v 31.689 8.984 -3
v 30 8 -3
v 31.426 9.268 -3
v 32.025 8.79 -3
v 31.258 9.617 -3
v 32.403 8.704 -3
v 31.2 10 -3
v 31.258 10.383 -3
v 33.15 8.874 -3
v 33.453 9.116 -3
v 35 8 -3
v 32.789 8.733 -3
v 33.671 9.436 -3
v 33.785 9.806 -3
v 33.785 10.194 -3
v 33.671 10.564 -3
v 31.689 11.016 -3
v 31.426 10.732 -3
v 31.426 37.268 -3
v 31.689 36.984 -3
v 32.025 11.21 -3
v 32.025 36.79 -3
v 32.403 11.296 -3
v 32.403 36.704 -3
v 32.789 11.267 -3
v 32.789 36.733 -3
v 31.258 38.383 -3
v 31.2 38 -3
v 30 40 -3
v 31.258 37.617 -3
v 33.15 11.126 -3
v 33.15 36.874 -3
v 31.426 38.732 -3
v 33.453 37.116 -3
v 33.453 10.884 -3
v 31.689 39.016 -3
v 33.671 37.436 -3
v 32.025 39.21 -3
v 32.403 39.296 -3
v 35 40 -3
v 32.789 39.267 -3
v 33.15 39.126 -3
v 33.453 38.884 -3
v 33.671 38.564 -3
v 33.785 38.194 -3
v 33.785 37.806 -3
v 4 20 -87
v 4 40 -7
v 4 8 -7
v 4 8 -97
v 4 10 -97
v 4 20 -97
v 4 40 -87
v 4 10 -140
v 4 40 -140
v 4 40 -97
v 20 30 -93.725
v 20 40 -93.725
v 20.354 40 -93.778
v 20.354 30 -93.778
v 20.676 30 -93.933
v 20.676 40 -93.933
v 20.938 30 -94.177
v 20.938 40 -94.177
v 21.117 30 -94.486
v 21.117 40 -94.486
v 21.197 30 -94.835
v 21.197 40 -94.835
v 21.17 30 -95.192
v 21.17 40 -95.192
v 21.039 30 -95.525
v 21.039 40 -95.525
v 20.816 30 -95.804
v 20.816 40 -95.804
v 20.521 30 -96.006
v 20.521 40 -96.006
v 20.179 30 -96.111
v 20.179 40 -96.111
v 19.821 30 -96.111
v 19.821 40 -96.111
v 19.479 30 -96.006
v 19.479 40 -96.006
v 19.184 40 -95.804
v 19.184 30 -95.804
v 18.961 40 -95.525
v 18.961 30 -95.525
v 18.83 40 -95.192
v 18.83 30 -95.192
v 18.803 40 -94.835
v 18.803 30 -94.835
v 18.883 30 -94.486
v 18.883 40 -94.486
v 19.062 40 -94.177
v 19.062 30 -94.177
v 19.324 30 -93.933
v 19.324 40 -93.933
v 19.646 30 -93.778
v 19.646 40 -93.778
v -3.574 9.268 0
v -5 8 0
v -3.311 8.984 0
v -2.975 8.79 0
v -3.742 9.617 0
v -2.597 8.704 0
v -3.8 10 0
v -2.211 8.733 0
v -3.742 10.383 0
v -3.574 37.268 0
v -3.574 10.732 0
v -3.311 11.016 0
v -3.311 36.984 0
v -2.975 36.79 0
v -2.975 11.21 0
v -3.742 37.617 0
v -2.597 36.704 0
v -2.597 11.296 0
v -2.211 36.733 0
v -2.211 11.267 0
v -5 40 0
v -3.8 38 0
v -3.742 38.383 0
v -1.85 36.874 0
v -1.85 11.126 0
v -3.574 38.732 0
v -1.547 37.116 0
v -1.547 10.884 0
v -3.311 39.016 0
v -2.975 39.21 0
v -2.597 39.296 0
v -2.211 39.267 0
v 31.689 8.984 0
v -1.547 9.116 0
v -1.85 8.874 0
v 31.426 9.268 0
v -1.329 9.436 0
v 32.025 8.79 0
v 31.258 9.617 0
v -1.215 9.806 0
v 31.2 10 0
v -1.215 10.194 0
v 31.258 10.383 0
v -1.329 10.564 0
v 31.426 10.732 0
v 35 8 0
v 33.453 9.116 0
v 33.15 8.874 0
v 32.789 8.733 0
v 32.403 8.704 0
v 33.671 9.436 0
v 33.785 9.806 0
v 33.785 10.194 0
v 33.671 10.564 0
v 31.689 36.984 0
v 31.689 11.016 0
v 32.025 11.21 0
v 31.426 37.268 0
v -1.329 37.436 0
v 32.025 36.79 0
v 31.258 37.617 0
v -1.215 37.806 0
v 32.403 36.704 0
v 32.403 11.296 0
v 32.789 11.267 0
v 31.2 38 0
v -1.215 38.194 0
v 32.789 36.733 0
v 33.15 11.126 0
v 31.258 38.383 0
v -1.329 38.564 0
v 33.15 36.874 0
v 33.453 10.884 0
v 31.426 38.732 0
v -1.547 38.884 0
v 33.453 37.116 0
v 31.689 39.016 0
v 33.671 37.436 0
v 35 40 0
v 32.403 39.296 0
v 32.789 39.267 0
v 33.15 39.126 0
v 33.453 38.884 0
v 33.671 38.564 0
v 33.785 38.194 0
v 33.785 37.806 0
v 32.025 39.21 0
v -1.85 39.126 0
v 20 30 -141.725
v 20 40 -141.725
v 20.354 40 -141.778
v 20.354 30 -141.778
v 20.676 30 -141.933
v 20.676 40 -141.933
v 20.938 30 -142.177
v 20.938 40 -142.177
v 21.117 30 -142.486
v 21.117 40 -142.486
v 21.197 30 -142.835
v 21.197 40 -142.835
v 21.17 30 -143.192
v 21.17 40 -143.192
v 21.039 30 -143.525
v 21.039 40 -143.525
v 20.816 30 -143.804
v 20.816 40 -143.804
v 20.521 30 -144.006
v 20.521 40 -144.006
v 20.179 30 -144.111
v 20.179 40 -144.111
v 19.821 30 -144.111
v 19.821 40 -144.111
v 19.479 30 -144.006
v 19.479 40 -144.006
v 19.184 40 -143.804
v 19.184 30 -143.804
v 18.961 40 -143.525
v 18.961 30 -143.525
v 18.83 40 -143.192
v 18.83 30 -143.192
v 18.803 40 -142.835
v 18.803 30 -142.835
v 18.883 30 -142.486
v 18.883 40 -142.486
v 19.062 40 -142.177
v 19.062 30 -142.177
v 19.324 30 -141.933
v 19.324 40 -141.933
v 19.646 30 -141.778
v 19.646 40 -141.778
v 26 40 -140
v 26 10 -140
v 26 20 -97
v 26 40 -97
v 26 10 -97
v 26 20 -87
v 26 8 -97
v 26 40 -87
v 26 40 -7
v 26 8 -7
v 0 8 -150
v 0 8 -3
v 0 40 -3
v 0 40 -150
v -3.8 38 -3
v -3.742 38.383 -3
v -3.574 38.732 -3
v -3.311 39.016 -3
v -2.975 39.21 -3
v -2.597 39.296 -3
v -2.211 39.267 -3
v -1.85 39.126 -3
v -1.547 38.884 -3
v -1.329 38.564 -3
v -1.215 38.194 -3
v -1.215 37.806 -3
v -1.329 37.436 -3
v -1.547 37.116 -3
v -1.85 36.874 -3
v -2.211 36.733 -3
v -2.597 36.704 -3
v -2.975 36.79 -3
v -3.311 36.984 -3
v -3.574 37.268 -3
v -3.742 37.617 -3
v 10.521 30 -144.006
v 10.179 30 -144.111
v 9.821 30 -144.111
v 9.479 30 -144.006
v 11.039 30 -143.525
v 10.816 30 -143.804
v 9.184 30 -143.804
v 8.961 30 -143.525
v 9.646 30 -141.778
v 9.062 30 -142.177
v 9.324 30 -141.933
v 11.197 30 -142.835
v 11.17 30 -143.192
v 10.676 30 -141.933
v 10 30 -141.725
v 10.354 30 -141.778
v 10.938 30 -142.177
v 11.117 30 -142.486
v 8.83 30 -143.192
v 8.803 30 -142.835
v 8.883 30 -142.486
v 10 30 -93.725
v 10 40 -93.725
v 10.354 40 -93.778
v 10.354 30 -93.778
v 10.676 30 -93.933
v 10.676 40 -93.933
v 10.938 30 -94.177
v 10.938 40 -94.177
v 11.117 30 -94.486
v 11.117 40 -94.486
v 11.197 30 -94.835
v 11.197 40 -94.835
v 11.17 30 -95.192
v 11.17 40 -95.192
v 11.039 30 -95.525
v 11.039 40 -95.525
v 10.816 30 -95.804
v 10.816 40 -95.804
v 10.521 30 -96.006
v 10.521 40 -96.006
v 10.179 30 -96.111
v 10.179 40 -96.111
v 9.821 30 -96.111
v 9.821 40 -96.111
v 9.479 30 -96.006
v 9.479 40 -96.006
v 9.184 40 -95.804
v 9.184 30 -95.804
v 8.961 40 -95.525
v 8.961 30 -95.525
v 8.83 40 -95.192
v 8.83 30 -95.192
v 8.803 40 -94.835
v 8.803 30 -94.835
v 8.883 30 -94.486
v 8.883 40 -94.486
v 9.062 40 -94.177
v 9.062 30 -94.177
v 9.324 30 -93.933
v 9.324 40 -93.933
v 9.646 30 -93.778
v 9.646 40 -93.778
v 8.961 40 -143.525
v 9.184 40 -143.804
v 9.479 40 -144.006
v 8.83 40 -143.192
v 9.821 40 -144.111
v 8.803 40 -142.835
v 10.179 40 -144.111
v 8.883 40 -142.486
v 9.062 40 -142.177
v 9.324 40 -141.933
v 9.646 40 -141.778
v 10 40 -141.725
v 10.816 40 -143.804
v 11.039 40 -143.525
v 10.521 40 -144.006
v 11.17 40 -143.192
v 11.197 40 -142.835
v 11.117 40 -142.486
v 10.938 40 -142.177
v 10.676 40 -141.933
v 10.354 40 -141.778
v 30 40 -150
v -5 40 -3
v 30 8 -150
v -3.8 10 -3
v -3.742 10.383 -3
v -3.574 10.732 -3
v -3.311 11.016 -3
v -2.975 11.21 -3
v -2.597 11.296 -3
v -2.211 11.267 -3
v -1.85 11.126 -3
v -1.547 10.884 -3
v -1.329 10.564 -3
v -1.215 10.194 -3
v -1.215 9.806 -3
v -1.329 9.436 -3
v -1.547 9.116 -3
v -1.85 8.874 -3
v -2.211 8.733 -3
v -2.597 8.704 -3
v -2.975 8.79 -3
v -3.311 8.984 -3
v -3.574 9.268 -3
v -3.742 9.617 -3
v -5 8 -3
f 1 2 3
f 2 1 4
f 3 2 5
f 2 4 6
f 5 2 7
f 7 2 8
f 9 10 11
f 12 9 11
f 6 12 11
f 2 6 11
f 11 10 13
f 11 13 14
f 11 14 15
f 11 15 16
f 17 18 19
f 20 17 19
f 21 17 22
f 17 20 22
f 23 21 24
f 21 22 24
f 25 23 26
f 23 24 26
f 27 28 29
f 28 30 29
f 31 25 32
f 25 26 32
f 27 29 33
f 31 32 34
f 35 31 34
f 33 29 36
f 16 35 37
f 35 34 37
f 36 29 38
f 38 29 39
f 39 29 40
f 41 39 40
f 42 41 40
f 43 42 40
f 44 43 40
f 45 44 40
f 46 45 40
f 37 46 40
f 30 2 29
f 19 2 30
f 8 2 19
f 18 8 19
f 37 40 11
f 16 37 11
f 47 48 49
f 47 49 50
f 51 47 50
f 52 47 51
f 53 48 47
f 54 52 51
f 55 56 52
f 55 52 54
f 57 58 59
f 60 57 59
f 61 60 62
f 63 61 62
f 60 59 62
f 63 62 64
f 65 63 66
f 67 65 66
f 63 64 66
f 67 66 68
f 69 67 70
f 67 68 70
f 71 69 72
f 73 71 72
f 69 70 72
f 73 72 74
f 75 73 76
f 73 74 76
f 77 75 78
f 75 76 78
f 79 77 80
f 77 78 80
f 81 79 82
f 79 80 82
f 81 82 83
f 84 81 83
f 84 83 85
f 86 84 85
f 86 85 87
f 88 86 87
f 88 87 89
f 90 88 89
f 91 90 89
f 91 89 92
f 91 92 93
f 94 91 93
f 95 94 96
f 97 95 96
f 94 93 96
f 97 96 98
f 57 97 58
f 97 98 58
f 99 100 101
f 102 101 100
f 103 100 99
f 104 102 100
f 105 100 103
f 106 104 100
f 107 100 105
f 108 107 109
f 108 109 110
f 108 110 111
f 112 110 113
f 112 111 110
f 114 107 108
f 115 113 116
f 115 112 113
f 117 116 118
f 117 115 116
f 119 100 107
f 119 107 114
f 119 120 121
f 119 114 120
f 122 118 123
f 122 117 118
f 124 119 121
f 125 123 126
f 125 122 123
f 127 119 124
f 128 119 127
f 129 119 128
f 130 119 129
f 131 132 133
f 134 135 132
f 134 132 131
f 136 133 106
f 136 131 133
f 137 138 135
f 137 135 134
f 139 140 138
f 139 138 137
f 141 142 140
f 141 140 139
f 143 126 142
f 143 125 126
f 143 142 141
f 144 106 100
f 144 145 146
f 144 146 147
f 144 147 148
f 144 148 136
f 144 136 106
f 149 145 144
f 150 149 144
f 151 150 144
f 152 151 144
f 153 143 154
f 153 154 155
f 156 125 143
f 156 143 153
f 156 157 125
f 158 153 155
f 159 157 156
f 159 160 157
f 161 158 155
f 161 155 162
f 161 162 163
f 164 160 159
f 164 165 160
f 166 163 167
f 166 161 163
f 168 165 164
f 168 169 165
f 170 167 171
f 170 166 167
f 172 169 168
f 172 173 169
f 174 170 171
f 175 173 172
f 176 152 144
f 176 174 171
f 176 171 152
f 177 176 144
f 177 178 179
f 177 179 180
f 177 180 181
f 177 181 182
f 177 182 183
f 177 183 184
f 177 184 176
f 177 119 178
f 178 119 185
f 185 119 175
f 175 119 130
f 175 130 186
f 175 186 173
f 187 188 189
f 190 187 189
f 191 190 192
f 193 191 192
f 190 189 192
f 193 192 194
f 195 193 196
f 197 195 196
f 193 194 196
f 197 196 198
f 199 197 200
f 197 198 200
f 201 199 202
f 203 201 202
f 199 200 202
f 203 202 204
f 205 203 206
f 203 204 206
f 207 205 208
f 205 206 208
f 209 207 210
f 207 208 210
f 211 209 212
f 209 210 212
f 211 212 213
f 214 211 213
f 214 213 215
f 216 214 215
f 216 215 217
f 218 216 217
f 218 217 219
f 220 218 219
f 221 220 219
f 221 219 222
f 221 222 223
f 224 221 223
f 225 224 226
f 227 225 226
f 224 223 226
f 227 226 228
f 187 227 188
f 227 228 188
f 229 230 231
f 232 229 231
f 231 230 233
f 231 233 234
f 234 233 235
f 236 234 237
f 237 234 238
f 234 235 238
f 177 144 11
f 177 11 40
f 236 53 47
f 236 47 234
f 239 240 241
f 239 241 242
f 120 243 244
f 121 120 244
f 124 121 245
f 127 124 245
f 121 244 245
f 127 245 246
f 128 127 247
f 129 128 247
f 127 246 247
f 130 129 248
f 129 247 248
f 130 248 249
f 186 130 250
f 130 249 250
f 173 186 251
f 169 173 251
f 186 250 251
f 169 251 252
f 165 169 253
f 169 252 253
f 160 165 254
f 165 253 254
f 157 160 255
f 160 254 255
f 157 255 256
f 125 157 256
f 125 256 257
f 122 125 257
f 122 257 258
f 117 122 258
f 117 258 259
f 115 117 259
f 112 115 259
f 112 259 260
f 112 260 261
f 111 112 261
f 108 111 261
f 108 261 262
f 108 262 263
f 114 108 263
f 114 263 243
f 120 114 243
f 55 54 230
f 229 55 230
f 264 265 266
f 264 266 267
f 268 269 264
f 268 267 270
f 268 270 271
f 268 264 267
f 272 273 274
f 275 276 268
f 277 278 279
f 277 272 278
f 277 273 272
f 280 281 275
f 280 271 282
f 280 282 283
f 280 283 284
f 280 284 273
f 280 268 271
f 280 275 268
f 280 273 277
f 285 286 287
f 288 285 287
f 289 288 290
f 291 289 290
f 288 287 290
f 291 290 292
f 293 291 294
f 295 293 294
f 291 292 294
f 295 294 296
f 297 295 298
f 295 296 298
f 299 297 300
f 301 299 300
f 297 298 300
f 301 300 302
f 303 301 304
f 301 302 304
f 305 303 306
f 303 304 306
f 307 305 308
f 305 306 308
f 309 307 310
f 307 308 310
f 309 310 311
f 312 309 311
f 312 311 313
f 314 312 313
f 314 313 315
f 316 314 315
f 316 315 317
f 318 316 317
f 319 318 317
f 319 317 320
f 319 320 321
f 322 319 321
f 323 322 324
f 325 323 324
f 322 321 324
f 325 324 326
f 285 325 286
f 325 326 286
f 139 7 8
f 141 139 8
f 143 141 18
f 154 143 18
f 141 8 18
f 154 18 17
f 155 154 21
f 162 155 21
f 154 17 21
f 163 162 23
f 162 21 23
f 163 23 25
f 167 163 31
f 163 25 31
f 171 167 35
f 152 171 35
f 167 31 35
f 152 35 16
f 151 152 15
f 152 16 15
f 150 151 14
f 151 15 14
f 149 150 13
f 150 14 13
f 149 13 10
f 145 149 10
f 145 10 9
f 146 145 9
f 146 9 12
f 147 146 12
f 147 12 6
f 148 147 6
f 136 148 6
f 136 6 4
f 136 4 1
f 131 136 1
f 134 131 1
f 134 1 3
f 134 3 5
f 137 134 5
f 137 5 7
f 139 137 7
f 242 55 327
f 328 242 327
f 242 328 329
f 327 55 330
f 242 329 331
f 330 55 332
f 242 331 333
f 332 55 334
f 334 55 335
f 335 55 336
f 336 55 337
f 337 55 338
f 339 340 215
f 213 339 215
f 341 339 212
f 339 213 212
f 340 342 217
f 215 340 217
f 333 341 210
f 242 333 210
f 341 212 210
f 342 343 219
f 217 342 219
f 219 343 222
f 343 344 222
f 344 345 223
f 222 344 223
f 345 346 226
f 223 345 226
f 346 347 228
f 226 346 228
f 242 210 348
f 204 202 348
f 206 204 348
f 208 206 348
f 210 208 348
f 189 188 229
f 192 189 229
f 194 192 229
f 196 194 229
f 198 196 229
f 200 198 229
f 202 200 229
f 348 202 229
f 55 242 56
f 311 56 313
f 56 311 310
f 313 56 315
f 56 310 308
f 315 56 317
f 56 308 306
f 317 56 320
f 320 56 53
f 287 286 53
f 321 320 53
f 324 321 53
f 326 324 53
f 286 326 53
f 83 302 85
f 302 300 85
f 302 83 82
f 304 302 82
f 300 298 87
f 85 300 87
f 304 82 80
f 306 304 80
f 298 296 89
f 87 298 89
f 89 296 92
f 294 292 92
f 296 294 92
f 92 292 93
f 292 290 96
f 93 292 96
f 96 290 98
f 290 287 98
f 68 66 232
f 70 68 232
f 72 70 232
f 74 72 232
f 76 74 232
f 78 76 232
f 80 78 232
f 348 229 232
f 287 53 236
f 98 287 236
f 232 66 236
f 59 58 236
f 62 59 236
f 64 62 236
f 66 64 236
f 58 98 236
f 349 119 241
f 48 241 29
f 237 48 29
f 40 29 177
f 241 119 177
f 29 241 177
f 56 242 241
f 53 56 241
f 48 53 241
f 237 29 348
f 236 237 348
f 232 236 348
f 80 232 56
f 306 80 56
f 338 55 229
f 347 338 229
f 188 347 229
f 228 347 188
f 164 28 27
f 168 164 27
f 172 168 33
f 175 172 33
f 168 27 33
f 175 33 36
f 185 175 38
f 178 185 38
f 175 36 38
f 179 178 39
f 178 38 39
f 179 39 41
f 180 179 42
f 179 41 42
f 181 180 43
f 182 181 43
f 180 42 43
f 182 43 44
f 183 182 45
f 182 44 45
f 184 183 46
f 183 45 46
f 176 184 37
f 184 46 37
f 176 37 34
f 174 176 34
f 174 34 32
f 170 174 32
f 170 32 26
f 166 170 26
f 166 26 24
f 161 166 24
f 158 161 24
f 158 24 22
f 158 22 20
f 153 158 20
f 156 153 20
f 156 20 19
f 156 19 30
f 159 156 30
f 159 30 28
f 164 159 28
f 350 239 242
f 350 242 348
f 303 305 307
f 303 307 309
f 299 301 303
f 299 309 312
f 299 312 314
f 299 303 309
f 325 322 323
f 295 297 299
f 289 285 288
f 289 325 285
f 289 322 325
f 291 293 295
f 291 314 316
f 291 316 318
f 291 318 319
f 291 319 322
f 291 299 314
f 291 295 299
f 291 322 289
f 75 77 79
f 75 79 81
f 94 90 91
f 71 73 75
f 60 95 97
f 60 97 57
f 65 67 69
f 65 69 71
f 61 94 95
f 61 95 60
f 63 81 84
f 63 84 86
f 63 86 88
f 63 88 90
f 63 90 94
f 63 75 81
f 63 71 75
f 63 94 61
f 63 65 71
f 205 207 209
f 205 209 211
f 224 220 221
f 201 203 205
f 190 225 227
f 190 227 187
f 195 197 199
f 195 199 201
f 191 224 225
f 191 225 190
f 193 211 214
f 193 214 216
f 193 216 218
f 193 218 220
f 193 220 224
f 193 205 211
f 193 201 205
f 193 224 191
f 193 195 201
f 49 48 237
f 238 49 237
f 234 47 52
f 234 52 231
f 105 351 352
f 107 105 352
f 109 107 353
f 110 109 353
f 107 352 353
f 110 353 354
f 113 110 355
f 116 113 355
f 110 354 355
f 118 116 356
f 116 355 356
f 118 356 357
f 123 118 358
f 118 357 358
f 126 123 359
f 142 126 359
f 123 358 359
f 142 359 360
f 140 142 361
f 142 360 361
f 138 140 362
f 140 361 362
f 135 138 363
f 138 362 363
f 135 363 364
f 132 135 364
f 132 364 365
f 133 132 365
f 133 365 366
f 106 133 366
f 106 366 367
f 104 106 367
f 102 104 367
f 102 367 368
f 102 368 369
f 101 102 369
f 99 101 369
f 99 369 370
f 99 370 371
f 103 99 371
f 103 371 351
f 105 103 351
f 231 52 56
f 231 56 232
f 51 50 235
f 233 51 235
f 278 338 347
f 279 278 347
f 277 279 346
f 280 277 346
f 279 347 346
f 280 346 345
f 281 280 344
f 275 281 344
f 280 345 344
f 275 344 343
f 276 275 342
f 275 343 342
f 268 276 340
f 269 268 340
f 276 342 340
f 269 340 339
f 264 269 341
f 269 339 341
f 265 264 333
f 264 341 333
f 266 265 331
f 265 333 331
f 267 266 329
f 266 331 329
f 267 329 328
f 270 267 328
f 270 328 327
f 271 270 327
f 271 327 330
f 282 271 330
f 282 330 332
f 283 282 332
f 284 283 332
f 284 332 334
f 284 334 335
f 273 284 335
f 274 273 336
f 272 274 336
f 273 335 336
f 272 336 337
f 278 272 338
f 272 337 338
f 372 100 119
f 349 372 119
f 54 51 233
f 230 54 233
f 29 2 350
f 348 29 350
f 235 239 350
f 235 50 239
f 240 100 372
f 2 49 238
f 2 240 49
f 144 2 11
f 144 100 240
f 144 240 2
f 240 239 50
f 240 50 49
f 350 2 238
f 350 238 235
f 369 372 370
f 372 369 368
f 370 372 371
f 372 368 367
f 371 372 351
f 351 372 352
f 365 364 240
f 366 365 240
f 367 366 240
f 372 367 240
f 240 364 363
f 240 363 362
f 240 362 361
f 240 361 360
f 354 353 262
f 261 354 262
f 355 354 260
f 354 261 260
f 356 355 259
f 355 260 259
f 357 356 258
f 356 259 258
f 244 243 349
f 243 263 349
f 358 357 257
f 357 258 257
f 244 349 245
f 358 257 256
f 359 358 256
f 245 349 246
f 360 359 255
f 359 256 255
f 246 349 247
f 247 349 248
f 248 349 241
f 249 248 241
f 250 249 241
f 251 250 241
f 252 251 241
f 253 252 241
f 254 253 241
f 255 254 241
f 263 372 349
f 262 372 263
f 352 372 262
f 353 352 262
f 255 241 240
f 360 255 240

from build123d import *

# Parameters (mm, degrees)
SKETCH1_W               = 30
SKETCH1_H               = 150
BOSS_EXTRUDE1_DEPTH     = 40
CUT_EXTRUDE1_DEPTH      = 159.113883008
CUT_EXTRUDE1_DEPTH_BACK = 30
SKETCH2_W               = 22
SKETCH2_H               = 43
SKETCH4_W               = 22
SKETCH4_H               = 10
CUT_EXTRUDE2_DEPTH      = 20
CUT_EXTRUDE3_DEPTH      = 159.113883008
CUT_EXTRUDE3_DEPTH_BACK = 159.113883008
SKETCH5_W               = 150
SKETCH5_H               = 8
SKETCH6_R               = 1.2
CUT_EXTRUDE4_DEPTH      = 10
SKETCH7_W               = 40
SKETCH7_H               = 32
BOSS_EXTRUDE2_DEPTH     = 3
SKETCH8_R               = 1.3
CUT_EXTRUDE5_DEPTH      = 157.31378698
SKETCH9_W               = 22
SKETCH9_H               = 80
CUT_EXTRUDE6_DEPTH      = 158.318148985


with BuildPart() as part:
    # Sketch1 → Boss-Extrude1 (new body)
    with BuildSketch(Plane(origin=(0, 0, 0), x_dir=(1, 0, 0), z_dir=(0, 1, 0))):
        with Locations((15, 75)):
            Rectangle(SKETCH1_W, SKETCH1_H)
    extrude(amount=BOSS_EXTRUDE1_DEPTH)

    # Sketch2 → Cut-Extrude1 (cut, two sides: drawn at the far end of the back side and taken through both)
    with BuildSketch(Plane(origin=(0, 40, 0), x_dir=(1, 0, 0), z_dir=(0, 1, 0)).offset(-CUT_EXTRUDE1_DEPTH_BACK)):
        with Locations((15, 118.5)):
            Rectangle(SKETCH2_W, SKETCH2_H)
    extrude(amount=CUT_EXTRUDE1_DEPTH + CUT_EXTRUDE1_DEPTH_BACK, mode=Mode.SUBTRACT)

    # Sketch4 → Cut-Extrude2 (cut)
    with BuildSketch(Plane.XZ):
        with Locations((15, -92)):
            Rectangle(SKETCH4_W, SKETCH4_H)
    extrude(amount=-CUT_EXTRUDE2_DEPTH, mode=Mode.SUBTRACT)

    # Sketch5 → Cut-Extrude3 (cut, two sides: drawn at the far end of the back side and taken through both)
    with BuildSketch(Plane.ZY.offset(-CUT_EXTRUDE3_DEPTH_BACK)):
        with Locations((-75, 4)):
            Rectangle(SKETCH5_W, SKETCH5_H)
    extrude(amount=CUT_EXTRUDE3_DEPTH + CUT_EXTRUDE3_DEPTH_BACK, mode=Mode.SUBTRACT)

    # Sketch6 → Cut-Extrude4 (cut)
    with BuildSketch(Plane(origin=(0, 40, 0), x_dir=(1, 0, 0), z_dir=(0, 1, 0))):
        with Locations(Location((10, 142.924700648, 0), (0, 0, 270))):
            Circle(SKETCH6_R)
        with Locations(Location((20, 142.924700648, 0), (0, 0, 270))):
            Circle(SKETCH6_R)
        with Locations(Location((10, 94.924700648, 0), (0, 0, 270))):
            Circle(SKETCH6_R)
        with Locations(Location((20, 94.924700648, 0), (0, 0, 270))):
            Circle(SKETCH6_R)
    extrude(amount=-CUT_EXTRUDE4_DEPTH, mode=Mode.SUBTRACT)

    # Sketch7 → Boss-Extrude2 (add)
    with BuildSketch(Plane.XY):
        with Locations((15, 24)):
            Rectangle(SKETCH7_W, SKETCH7_H)
    extrude(amount=-BOSS_EXTRUDE2_DEPTH)

    # Sketch8 → Cut-Extrude5 (cut, through all)
    with BuildSketch(Plane(origin=(0, 0, -3), x_dir=(-1, 0, 0), z_dir=(0, 0, -1))):
        with Locations((-32.5, 38)):
            Circle(SKETCH8_R)
        with Locations((-32.5, 10)):
            Circle(SKETCH8_R)
        with Locations((2.5, 38)):
            Circle(SKETCH8_R)
        with Locations((2.5, 10)):
            Circle(SKETCH8_R)
    extrude(amount=-CUT_EXTRUDE5_DEPTH, mode=Mode.SUBTRACT)

    # Sketch9 → Cut-Extrude6 (cut, through all)
    with BuildSketch(Plane(origin=(0, 40, 0), x_dir=(1, 0, 0), z_dir=(0, 1, 0))):
        with Locations((15, 47)):
            Rectangle(SKETCH9_W, SKETCH9_H)
    extrude(amount=-CUT_EXTRUDE6_DEPTH, mode=Mode.SUBTRACT)


solid = part.part
